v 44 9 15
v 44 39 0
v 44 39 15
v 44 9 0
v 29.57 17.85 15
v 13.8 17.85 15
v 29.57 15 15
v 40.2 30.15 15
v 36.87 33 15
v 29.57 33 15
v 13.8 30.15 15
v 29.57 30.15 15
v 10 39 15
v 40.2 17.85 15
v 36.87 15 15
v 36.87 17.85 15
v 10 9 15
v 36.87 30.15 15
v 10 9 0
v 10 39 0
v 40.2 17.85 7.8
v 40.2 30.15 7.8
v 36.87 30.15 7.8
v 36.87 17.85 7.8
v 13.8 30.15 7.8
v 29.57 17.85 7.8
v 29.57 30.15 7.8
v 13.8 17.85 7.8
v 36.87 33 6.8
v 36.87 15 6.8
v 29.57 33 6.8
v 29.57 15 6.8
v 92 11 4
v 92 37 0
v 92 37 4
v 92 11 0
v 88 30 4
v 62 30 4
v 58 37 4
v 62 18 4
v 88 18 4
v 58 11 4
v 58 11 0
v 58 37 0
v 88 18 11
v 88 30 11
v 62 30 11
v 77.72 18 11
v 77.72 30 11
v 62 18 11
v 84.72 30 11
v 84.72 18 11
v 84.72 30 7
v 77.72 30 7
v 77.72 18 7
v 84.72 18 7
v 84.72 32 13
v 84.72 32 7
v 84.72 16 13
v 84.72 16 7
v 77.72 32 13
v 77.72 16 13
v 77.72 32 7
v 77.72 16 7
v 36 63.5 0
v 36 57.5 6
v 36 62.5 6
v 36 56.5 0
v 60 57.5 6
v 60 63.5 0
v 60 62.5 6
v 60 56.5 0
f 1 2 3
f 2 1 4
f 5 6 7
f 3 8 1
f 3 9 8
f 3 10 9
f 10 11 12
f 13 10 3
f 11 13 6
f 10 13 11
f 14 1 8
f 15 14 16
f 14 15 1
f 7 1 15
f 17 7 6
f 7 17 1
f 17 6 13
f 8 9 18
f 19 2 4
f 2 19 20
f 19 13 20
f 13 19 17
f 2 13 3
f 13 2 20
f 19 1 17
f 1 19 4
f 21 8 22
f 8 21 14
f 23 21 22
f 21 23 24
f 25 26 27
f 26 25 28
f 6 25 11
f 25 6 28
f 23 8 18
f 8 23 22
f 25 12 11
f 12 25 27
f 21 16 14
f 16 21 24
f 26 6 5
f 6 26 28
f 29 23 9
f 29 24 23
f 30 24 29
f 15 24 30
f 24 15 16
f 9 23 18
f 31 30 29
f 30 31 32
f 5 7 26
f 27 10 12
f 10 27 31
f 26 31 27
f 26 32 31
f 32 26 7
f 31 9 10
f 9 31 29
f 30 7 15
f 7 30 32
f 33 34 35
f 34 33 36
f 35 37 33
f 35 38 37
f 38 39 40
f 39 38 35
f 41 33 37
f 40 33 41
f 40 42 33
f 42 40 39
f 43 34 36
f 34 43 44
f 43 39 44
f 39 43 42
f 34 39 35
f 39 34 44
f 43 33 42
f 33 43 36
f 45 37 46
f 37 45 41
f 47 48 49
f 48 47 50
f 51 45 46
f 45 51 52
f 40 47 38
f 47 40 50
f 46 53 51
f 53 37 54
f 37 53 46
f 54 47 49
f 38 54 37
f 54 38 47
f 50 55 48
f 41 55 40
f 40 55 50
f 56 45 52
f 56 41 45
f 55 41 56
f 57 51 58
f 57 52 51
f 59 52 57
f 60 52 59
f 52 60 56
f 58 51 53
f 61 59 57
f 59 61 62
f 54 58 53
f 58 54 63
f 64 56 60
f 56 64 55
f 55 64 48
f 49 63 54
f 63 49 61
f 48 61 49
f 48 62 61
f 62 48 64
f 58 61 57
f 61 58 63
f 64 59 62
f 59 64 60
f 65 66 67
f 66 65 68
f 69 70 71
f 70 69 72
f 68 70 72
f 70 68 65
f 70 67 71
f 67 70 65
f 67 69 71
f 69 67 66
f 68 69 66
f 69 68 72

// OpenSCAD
/*
Sample 053: Nut-Feder-Verbindung mit Querkeil — 0,15 mm
Generated from the FDM Mechanical Sample Library.
Units: millimetres.

Override examples:
  openscad -o custom.stl -D 'view="plate"' -D 'render_fn=64' model.scad
  openscad -o preview.png -D 'view="assembly"' model.scad
*/
use <../../../library/fdm_mechanisms.scad>

render_fn = is_undef(render_fn) ? 48 : render_fn;
view = is_undef(view) ? "plate" : view;
$fn = render_fn;

sample_wedge_lock_joint(
    view=view,
    clearance=0.15
);
